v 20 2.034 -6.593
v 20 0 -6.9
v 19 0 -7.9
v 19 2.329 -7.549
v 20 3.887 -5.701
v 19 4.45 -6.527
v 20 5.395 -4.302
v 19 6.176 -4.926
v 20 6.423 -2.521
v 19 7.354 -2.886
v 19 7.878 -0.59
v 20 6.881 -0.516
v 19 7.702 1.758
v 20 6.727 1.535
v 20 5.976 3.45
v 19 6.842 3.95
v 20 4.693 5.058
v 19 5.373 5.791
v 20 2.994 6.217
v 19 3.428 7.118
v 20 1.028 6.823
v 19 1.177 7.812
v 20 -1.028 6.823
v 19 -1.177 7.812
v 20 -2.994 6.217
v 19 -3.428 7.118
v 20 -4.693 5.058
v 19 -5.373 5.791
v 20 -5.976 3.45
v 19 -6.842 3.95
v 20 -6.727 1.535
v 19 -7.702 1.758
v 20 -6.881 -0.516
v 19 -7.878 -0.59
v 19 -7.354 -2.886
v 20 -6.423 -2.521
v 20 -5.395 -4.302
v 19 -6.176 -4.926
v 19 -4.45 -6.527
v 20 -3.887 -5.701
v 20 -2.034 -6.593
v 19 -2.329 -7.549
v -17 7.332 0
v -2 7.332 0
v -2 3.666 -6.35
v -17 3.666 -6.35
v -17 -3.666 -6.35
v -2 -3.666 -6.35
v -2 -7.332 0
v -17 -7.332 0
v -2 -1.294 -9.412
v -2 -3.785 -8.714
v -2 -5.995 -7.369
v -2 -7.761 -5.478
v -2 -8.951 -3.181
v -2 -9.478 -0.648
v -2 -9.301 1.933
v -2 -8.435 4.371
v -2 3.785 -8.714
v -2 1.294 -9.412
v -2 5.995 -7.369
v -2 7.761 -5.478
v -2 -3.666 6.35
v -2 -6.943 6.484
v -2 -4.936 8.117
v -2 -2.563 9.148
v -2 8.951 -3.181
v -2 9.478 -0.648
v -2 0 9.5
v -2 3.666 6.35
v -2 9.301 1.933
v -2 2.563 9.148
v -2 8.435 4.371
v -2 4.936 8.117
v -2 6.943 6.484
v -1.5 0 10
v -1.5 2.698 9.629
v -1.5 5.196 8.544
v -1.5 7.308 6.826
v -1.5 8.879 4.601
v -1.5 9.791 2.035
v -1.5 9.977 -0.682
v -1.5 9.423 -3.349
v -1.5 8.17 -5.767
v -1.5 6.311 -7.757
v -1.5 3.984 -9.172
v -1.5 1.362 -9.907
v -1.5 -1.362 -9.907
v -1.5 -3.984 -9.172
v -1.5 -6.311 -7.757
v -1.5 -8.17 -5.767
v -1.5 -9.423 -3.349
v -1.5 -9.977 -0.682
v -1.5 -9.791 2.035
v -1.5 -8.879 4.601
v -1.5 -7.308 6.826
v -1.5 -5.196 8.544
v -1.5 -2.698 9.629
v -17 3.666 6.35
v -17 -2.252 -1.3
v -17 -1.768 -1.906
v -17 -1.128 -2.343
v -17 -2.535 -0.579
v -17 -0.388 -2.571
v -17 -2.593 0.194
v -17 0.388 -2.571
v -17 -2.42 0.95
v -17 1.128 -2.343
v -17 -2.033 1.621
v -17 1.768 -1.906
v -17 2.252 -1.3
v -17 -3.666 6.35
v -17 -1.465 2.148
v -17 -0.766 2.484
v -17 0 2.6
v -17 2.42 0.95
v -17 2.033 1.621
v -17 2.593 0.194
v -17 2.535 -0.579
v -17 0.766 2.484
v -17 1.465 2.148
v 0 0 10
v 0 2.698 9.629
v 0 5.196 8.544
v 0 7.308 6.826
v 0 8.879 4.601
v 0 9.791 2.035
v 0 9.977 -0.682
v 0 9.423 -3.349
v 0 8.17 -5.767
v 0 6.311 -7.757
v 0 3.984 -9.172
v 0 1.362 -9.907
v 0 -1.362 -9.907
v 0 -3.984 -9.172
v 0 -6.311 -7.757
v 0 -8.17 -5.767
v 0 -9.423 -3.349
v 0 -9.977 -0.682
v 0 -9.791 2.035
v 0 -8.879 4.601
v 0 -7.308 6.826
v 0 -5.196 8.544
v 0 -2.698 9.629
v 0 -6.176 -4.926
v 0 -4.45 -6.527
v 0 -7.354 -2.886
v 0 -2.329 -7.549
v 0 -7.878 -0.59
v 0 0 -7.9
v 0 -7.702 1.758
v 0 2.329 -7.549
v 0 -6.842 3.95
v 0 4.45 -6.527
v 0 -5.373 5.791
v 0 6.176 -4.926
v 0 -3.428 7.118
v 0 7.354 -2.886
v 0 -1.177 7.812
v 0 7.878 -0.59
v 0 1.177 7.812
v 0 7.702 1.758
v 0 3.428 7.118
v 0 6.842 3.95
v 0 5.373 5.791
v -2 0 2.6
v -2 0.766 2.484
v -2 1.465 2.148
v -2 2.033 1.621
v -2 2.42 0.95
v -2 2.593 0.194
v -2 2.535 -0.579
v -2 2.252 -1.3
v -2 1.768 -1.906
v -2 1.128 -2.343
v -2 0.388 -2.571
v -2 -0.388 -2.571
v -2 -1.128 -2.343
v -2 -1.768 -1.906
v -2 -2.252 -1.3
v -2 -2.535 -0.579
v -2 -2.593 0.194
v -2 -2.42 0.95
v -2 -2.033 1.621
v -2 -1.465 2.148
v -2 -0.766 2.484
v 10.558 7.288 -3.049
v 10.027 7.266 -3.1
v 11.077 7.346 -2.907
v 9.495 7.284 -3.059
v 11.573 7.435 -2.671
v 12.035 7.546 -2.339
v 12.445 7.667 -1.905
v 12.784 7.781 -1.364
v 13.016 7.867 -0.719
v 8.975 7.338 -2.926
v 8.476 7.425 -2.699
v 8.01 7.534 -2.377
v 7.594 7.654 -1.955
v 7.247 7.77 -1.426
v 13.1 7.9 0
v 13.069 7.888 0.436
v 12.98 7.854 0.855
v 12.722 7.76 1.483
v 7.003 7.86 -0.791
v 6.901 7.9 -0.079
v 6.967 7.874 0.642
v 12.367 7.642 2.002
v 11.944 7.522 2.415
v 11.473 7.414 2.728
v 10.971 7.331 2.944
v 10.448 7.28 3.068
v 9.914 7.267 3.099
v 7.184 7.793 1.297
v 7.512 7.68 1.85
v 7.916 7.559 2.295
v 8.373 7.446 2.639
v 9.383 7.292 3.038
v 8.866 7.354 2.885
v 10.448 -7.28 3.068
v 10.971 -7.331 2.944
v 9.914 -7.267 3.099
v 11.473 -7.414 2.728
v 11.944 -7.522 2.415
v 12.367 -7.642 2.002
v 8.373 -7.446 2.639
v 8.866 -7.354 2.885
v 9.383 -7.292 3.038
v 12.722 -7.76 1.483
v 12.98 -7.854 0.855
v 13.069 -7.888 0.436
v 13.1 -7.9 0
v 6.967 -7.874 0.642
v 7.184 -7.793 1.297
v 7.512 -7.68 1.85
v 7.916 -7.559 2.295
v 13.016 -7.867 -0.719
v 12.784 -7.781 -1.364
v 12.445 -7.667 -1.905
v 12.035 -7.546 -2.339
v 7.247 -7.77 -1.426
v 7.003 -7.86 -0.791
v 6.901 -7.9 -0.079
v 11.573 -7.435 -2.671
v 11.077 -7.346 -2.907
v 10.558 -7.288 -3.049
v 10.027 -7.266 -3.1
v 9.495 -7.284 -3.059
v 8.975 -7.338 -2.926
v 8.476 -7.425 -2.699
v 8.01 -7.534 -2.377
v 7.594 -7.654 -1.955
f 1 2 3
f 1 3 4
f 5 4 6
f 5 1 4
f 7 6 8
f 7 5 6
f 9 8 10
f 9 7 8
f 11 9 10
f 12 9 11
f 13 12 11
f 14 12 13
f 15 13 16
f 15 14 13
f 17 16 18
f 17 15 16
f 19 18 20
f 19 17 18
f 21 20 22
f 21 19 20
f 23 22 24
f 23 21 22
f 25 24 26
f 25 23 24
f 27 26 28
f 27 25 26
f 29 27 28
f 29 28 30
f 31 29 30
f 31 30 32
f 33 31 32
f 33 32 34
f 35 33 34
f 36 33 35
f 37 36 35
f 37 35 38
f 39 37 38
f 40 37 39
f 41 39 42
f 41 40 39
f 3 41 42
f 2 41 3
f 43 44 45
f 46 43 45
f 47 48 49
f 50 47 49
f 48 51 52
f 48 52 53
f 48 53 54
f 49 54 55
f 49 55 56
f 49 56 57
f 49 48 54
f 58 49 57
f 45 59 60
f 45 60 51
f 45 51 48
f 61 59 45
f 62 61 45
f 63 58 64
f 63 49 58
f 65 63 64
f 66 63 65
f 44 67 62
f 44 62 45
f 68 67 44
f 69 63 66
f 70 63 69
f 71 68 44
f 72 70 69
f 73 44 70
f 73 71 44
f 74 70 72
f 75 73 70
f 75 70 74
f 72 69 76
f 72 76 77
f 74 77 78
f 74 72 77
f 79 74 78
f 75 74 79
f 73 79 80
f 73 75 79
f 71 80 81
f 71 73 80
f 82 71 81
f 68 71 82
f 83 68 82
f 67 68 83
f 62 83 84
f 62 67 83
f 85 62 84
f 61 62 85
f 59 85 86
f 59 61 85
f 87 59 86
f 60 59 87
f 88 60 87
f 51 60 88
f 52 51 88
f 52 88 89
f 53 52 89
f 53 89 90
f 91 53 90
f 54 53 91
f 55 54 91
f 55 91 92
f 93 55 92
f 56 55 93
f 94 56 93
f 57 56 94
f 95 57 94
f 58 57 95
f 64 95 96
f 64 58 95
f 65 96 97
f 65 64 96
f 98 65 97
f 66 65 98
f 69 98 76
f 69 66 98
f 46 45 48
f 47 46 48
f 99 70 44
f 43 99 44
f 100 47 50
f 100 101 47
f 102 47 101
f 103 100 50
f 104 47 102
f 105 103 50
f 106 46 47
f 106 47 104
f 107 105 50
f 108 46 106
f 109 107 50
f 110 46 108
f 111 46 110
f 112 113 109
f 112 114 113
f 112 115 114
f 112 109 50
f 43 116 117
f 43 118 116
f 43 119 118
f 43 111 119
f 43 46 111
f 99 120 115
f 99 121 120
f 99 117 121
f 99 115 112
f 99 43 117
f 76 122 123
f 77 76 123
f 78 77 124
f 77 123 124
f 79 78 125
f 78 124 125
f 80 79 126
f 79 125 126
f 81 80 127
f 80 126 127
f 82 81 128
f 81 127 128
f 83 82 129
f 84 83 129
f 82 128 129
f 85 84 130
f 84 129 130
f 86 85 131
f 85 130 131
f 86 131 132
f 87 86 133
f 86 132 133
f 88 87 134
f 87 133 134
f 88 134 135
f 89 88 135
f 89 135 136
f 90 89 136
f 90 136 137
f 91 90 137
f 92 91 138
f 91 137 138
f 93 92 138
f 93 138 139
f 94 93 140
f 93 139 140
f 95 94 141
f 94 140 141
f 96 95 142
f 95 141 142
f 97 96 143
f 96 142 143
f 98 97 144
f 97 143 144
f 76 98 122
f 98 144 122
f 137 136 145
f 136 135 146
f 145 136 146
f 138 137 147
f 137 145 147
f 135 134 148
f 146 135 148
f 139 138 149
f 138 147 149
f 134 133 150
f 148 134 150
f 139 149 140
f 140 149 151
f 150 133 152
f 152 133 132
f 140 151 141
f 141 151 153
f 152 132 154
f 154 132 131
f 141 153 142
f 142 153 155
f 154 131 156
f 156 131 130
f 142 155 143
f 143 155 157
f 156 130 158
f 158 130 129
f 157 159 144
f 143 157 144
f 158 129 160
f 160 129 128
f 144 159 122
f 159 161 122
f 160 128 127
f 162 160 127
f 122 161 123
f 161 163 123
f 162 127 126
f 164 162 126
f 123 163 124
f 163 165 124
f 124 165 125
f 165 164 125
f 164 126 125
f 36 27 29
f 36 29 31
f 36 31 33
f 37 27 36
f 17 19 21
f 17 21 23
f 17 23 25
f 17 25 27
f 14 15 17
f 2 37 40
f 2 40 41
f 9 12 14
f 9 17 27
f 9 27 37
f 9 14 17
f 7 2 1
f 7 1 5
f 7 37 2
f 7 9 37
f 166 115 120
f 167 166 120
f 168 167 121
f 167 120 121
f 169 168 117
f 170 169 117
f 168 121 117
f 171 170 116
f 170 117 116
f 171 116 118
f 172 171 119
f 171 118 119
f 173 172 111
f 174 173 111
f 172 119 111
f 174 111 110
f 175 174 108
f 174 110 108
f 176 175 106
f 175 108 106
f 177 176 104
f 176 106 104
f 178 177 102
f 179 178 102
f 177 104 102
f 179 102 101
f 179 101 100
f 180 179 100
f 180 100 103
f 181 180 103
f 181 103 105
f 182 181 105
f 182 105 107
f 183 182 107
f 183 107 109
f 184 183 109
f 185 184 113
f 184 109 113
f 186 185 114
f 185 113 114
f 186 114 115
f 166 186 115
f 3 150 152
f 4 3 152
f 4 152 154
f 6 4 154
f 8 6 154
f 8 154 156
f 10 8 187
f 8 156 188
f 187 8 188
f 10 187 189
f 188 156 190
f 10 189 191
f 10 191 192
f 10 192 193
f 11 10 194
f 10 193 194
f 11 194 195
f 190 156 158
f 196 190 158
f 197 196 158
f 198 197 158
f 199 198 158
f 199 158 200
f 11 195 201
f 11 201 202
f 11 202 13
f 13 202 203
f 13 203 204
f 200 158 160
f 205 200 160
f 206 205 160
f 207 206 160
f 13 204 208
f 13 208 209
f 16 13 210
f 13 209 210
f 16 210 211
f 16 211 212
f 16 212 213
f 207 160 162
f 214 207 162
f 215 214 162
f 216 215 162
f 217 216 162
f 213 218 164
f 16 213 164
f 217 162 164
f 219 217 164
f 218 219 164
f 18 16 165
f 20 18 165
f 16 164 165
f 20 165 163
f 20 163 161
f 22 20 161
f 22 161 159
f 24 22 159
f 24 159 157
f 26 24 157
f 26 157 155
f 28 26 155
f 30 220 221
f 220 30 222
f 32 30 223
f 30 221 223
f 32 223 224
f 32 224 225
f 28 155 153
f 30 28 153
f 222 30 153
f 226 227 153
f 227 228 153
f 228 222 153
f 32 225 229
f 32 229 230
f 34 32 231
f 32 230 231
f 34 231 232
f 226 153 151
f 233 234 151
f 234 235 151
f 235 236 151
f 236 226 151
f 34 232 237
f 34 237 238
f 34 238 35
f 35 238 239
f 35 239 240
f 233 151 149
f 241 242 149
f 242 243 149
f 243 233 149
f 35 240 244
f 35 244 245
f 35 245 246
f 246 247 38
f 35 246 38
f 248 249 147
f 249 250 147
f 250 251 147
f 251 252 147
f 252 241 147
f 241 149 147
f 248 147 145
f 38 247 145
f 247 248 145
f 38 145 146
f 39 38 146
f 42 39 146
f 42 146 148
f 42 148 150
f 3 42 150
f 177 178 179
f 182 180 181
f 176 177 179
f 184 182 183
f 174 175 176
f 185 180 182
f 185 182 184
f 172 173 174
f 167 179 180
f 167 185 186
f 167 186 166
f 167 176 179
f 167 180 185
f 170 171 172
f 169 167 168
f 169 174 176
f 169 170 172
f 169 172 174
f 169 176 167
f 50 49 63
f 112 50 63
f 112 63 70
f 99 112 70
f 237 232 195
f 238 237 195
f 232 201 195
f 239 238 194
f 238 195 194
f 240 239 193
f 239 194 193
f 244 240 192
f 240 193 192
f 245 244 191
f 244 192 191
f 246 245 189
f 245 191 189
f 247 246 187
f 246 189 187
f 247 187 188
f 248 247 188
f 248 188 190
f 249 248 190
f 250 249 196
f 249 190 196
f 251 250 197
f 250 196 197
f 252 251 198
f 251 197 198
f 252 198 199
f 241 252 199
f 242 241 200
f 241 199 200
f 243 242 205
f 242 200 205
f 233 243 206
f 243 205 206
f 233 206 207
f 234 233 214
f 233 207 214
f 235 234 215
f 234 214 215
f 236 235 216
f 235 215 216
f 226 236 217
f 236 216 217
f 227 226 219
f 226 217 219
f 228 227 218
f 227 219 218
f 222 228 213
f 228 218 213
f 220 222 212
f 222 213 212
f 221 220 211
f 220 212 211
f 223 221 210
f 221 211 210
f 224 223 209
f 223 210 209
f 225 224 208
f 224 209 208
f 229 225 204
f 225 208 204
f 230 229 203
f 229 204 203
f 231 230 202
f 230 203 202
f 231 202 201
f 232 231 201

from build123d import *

# Parameters (mm, degrees)
SKETCH_1_R          = 7.9
EXTRUDE_1_DEPTH     = 20
SKETCH_3_R          = 10
EXTRUDE_2_DEPTH     = 2
EXTRUDE_3_DEPTH     = 15
SKETCH_5_R          = 3.1
CUT_EXTRUDE_1_DEPTH = 10
CHAMFER_1_SIZE      = 0.5
SKETCH_6_R          = 2.6
CUT_EXTRUDE_2_DEPTH = 15
CHAMFER_2_SIZE      = 1


with BuildPart() as part:
    # 草图1 → 凸台-拉伸1 (new body)
    with BuildSketch(Plane(origin=(0, 0, 0), x_dir=(0, 0, -1), z_dir=(1, 0, 0))):
        Circle(SKETCH_1_R)
    extrude(amount=EXTRUDE_1_DEPTH)

    # 草图3 → 凸台-拉伸2 (add)
    with BuildSketch(Plane.ZY):
        Circle(SKETCH_3_R)
    extrude(amount=EXTRUDE_2_DEPTH)

    # 草图4 → 凸台-拉伸3 (add)
    with BuildSketch(Plane.ZY.offset(2)):
        Polygon((6.35, 3.666174209), (0, 7.332348419), (-6.35, 3.666174209), (-6.35, -3.666174209), (0, -7.332348419), (6.35, -3.666174209), align=None)
    extrude(amount=EXTRUDE_3_DEPTH)

    # 草图5 → 切除-拉伸1 (cut, symmetric)
    with BuildSketch(Plane(origin=(0, 0, 0), x_dir=(1, 0, 0), z_dir=(0, 1, 0))):
        with Locations((10, 0)):
            Circle(SKETCH_5_R)
    extrude(amount=CUT_EXTRUDE_1_DEPTH, both=True, mode=Mode.SUBTRACT)

    # 倒角1
    chamfer_1_edges = [part.edges().sort_by_distance(p)[0] for p in [
        (-2, 0, -10),
    ]]
    chamfer(chamfer_1_edges, length=CHAMFER_1_SIZE)

    # 草图6 → 切除-拉伸2 (cut)
    with BuildSketch(Plane.ZY.offset(17)):
        Circle(SKETCH_6_R)
    extrude(amount=-CUT_EXTRUDE_2_DEPTH, mode=Mode.SUBTRACT)

    # 倒角2
    chamfer_2_edges = [part.edges().sort_by_distance(p)[0] for p in [
        (20, 0, 7.9),
    ]]
    chamfer(chamfer_2_edges, length=CHAMFER_2_SIZE)


solid = part.part
